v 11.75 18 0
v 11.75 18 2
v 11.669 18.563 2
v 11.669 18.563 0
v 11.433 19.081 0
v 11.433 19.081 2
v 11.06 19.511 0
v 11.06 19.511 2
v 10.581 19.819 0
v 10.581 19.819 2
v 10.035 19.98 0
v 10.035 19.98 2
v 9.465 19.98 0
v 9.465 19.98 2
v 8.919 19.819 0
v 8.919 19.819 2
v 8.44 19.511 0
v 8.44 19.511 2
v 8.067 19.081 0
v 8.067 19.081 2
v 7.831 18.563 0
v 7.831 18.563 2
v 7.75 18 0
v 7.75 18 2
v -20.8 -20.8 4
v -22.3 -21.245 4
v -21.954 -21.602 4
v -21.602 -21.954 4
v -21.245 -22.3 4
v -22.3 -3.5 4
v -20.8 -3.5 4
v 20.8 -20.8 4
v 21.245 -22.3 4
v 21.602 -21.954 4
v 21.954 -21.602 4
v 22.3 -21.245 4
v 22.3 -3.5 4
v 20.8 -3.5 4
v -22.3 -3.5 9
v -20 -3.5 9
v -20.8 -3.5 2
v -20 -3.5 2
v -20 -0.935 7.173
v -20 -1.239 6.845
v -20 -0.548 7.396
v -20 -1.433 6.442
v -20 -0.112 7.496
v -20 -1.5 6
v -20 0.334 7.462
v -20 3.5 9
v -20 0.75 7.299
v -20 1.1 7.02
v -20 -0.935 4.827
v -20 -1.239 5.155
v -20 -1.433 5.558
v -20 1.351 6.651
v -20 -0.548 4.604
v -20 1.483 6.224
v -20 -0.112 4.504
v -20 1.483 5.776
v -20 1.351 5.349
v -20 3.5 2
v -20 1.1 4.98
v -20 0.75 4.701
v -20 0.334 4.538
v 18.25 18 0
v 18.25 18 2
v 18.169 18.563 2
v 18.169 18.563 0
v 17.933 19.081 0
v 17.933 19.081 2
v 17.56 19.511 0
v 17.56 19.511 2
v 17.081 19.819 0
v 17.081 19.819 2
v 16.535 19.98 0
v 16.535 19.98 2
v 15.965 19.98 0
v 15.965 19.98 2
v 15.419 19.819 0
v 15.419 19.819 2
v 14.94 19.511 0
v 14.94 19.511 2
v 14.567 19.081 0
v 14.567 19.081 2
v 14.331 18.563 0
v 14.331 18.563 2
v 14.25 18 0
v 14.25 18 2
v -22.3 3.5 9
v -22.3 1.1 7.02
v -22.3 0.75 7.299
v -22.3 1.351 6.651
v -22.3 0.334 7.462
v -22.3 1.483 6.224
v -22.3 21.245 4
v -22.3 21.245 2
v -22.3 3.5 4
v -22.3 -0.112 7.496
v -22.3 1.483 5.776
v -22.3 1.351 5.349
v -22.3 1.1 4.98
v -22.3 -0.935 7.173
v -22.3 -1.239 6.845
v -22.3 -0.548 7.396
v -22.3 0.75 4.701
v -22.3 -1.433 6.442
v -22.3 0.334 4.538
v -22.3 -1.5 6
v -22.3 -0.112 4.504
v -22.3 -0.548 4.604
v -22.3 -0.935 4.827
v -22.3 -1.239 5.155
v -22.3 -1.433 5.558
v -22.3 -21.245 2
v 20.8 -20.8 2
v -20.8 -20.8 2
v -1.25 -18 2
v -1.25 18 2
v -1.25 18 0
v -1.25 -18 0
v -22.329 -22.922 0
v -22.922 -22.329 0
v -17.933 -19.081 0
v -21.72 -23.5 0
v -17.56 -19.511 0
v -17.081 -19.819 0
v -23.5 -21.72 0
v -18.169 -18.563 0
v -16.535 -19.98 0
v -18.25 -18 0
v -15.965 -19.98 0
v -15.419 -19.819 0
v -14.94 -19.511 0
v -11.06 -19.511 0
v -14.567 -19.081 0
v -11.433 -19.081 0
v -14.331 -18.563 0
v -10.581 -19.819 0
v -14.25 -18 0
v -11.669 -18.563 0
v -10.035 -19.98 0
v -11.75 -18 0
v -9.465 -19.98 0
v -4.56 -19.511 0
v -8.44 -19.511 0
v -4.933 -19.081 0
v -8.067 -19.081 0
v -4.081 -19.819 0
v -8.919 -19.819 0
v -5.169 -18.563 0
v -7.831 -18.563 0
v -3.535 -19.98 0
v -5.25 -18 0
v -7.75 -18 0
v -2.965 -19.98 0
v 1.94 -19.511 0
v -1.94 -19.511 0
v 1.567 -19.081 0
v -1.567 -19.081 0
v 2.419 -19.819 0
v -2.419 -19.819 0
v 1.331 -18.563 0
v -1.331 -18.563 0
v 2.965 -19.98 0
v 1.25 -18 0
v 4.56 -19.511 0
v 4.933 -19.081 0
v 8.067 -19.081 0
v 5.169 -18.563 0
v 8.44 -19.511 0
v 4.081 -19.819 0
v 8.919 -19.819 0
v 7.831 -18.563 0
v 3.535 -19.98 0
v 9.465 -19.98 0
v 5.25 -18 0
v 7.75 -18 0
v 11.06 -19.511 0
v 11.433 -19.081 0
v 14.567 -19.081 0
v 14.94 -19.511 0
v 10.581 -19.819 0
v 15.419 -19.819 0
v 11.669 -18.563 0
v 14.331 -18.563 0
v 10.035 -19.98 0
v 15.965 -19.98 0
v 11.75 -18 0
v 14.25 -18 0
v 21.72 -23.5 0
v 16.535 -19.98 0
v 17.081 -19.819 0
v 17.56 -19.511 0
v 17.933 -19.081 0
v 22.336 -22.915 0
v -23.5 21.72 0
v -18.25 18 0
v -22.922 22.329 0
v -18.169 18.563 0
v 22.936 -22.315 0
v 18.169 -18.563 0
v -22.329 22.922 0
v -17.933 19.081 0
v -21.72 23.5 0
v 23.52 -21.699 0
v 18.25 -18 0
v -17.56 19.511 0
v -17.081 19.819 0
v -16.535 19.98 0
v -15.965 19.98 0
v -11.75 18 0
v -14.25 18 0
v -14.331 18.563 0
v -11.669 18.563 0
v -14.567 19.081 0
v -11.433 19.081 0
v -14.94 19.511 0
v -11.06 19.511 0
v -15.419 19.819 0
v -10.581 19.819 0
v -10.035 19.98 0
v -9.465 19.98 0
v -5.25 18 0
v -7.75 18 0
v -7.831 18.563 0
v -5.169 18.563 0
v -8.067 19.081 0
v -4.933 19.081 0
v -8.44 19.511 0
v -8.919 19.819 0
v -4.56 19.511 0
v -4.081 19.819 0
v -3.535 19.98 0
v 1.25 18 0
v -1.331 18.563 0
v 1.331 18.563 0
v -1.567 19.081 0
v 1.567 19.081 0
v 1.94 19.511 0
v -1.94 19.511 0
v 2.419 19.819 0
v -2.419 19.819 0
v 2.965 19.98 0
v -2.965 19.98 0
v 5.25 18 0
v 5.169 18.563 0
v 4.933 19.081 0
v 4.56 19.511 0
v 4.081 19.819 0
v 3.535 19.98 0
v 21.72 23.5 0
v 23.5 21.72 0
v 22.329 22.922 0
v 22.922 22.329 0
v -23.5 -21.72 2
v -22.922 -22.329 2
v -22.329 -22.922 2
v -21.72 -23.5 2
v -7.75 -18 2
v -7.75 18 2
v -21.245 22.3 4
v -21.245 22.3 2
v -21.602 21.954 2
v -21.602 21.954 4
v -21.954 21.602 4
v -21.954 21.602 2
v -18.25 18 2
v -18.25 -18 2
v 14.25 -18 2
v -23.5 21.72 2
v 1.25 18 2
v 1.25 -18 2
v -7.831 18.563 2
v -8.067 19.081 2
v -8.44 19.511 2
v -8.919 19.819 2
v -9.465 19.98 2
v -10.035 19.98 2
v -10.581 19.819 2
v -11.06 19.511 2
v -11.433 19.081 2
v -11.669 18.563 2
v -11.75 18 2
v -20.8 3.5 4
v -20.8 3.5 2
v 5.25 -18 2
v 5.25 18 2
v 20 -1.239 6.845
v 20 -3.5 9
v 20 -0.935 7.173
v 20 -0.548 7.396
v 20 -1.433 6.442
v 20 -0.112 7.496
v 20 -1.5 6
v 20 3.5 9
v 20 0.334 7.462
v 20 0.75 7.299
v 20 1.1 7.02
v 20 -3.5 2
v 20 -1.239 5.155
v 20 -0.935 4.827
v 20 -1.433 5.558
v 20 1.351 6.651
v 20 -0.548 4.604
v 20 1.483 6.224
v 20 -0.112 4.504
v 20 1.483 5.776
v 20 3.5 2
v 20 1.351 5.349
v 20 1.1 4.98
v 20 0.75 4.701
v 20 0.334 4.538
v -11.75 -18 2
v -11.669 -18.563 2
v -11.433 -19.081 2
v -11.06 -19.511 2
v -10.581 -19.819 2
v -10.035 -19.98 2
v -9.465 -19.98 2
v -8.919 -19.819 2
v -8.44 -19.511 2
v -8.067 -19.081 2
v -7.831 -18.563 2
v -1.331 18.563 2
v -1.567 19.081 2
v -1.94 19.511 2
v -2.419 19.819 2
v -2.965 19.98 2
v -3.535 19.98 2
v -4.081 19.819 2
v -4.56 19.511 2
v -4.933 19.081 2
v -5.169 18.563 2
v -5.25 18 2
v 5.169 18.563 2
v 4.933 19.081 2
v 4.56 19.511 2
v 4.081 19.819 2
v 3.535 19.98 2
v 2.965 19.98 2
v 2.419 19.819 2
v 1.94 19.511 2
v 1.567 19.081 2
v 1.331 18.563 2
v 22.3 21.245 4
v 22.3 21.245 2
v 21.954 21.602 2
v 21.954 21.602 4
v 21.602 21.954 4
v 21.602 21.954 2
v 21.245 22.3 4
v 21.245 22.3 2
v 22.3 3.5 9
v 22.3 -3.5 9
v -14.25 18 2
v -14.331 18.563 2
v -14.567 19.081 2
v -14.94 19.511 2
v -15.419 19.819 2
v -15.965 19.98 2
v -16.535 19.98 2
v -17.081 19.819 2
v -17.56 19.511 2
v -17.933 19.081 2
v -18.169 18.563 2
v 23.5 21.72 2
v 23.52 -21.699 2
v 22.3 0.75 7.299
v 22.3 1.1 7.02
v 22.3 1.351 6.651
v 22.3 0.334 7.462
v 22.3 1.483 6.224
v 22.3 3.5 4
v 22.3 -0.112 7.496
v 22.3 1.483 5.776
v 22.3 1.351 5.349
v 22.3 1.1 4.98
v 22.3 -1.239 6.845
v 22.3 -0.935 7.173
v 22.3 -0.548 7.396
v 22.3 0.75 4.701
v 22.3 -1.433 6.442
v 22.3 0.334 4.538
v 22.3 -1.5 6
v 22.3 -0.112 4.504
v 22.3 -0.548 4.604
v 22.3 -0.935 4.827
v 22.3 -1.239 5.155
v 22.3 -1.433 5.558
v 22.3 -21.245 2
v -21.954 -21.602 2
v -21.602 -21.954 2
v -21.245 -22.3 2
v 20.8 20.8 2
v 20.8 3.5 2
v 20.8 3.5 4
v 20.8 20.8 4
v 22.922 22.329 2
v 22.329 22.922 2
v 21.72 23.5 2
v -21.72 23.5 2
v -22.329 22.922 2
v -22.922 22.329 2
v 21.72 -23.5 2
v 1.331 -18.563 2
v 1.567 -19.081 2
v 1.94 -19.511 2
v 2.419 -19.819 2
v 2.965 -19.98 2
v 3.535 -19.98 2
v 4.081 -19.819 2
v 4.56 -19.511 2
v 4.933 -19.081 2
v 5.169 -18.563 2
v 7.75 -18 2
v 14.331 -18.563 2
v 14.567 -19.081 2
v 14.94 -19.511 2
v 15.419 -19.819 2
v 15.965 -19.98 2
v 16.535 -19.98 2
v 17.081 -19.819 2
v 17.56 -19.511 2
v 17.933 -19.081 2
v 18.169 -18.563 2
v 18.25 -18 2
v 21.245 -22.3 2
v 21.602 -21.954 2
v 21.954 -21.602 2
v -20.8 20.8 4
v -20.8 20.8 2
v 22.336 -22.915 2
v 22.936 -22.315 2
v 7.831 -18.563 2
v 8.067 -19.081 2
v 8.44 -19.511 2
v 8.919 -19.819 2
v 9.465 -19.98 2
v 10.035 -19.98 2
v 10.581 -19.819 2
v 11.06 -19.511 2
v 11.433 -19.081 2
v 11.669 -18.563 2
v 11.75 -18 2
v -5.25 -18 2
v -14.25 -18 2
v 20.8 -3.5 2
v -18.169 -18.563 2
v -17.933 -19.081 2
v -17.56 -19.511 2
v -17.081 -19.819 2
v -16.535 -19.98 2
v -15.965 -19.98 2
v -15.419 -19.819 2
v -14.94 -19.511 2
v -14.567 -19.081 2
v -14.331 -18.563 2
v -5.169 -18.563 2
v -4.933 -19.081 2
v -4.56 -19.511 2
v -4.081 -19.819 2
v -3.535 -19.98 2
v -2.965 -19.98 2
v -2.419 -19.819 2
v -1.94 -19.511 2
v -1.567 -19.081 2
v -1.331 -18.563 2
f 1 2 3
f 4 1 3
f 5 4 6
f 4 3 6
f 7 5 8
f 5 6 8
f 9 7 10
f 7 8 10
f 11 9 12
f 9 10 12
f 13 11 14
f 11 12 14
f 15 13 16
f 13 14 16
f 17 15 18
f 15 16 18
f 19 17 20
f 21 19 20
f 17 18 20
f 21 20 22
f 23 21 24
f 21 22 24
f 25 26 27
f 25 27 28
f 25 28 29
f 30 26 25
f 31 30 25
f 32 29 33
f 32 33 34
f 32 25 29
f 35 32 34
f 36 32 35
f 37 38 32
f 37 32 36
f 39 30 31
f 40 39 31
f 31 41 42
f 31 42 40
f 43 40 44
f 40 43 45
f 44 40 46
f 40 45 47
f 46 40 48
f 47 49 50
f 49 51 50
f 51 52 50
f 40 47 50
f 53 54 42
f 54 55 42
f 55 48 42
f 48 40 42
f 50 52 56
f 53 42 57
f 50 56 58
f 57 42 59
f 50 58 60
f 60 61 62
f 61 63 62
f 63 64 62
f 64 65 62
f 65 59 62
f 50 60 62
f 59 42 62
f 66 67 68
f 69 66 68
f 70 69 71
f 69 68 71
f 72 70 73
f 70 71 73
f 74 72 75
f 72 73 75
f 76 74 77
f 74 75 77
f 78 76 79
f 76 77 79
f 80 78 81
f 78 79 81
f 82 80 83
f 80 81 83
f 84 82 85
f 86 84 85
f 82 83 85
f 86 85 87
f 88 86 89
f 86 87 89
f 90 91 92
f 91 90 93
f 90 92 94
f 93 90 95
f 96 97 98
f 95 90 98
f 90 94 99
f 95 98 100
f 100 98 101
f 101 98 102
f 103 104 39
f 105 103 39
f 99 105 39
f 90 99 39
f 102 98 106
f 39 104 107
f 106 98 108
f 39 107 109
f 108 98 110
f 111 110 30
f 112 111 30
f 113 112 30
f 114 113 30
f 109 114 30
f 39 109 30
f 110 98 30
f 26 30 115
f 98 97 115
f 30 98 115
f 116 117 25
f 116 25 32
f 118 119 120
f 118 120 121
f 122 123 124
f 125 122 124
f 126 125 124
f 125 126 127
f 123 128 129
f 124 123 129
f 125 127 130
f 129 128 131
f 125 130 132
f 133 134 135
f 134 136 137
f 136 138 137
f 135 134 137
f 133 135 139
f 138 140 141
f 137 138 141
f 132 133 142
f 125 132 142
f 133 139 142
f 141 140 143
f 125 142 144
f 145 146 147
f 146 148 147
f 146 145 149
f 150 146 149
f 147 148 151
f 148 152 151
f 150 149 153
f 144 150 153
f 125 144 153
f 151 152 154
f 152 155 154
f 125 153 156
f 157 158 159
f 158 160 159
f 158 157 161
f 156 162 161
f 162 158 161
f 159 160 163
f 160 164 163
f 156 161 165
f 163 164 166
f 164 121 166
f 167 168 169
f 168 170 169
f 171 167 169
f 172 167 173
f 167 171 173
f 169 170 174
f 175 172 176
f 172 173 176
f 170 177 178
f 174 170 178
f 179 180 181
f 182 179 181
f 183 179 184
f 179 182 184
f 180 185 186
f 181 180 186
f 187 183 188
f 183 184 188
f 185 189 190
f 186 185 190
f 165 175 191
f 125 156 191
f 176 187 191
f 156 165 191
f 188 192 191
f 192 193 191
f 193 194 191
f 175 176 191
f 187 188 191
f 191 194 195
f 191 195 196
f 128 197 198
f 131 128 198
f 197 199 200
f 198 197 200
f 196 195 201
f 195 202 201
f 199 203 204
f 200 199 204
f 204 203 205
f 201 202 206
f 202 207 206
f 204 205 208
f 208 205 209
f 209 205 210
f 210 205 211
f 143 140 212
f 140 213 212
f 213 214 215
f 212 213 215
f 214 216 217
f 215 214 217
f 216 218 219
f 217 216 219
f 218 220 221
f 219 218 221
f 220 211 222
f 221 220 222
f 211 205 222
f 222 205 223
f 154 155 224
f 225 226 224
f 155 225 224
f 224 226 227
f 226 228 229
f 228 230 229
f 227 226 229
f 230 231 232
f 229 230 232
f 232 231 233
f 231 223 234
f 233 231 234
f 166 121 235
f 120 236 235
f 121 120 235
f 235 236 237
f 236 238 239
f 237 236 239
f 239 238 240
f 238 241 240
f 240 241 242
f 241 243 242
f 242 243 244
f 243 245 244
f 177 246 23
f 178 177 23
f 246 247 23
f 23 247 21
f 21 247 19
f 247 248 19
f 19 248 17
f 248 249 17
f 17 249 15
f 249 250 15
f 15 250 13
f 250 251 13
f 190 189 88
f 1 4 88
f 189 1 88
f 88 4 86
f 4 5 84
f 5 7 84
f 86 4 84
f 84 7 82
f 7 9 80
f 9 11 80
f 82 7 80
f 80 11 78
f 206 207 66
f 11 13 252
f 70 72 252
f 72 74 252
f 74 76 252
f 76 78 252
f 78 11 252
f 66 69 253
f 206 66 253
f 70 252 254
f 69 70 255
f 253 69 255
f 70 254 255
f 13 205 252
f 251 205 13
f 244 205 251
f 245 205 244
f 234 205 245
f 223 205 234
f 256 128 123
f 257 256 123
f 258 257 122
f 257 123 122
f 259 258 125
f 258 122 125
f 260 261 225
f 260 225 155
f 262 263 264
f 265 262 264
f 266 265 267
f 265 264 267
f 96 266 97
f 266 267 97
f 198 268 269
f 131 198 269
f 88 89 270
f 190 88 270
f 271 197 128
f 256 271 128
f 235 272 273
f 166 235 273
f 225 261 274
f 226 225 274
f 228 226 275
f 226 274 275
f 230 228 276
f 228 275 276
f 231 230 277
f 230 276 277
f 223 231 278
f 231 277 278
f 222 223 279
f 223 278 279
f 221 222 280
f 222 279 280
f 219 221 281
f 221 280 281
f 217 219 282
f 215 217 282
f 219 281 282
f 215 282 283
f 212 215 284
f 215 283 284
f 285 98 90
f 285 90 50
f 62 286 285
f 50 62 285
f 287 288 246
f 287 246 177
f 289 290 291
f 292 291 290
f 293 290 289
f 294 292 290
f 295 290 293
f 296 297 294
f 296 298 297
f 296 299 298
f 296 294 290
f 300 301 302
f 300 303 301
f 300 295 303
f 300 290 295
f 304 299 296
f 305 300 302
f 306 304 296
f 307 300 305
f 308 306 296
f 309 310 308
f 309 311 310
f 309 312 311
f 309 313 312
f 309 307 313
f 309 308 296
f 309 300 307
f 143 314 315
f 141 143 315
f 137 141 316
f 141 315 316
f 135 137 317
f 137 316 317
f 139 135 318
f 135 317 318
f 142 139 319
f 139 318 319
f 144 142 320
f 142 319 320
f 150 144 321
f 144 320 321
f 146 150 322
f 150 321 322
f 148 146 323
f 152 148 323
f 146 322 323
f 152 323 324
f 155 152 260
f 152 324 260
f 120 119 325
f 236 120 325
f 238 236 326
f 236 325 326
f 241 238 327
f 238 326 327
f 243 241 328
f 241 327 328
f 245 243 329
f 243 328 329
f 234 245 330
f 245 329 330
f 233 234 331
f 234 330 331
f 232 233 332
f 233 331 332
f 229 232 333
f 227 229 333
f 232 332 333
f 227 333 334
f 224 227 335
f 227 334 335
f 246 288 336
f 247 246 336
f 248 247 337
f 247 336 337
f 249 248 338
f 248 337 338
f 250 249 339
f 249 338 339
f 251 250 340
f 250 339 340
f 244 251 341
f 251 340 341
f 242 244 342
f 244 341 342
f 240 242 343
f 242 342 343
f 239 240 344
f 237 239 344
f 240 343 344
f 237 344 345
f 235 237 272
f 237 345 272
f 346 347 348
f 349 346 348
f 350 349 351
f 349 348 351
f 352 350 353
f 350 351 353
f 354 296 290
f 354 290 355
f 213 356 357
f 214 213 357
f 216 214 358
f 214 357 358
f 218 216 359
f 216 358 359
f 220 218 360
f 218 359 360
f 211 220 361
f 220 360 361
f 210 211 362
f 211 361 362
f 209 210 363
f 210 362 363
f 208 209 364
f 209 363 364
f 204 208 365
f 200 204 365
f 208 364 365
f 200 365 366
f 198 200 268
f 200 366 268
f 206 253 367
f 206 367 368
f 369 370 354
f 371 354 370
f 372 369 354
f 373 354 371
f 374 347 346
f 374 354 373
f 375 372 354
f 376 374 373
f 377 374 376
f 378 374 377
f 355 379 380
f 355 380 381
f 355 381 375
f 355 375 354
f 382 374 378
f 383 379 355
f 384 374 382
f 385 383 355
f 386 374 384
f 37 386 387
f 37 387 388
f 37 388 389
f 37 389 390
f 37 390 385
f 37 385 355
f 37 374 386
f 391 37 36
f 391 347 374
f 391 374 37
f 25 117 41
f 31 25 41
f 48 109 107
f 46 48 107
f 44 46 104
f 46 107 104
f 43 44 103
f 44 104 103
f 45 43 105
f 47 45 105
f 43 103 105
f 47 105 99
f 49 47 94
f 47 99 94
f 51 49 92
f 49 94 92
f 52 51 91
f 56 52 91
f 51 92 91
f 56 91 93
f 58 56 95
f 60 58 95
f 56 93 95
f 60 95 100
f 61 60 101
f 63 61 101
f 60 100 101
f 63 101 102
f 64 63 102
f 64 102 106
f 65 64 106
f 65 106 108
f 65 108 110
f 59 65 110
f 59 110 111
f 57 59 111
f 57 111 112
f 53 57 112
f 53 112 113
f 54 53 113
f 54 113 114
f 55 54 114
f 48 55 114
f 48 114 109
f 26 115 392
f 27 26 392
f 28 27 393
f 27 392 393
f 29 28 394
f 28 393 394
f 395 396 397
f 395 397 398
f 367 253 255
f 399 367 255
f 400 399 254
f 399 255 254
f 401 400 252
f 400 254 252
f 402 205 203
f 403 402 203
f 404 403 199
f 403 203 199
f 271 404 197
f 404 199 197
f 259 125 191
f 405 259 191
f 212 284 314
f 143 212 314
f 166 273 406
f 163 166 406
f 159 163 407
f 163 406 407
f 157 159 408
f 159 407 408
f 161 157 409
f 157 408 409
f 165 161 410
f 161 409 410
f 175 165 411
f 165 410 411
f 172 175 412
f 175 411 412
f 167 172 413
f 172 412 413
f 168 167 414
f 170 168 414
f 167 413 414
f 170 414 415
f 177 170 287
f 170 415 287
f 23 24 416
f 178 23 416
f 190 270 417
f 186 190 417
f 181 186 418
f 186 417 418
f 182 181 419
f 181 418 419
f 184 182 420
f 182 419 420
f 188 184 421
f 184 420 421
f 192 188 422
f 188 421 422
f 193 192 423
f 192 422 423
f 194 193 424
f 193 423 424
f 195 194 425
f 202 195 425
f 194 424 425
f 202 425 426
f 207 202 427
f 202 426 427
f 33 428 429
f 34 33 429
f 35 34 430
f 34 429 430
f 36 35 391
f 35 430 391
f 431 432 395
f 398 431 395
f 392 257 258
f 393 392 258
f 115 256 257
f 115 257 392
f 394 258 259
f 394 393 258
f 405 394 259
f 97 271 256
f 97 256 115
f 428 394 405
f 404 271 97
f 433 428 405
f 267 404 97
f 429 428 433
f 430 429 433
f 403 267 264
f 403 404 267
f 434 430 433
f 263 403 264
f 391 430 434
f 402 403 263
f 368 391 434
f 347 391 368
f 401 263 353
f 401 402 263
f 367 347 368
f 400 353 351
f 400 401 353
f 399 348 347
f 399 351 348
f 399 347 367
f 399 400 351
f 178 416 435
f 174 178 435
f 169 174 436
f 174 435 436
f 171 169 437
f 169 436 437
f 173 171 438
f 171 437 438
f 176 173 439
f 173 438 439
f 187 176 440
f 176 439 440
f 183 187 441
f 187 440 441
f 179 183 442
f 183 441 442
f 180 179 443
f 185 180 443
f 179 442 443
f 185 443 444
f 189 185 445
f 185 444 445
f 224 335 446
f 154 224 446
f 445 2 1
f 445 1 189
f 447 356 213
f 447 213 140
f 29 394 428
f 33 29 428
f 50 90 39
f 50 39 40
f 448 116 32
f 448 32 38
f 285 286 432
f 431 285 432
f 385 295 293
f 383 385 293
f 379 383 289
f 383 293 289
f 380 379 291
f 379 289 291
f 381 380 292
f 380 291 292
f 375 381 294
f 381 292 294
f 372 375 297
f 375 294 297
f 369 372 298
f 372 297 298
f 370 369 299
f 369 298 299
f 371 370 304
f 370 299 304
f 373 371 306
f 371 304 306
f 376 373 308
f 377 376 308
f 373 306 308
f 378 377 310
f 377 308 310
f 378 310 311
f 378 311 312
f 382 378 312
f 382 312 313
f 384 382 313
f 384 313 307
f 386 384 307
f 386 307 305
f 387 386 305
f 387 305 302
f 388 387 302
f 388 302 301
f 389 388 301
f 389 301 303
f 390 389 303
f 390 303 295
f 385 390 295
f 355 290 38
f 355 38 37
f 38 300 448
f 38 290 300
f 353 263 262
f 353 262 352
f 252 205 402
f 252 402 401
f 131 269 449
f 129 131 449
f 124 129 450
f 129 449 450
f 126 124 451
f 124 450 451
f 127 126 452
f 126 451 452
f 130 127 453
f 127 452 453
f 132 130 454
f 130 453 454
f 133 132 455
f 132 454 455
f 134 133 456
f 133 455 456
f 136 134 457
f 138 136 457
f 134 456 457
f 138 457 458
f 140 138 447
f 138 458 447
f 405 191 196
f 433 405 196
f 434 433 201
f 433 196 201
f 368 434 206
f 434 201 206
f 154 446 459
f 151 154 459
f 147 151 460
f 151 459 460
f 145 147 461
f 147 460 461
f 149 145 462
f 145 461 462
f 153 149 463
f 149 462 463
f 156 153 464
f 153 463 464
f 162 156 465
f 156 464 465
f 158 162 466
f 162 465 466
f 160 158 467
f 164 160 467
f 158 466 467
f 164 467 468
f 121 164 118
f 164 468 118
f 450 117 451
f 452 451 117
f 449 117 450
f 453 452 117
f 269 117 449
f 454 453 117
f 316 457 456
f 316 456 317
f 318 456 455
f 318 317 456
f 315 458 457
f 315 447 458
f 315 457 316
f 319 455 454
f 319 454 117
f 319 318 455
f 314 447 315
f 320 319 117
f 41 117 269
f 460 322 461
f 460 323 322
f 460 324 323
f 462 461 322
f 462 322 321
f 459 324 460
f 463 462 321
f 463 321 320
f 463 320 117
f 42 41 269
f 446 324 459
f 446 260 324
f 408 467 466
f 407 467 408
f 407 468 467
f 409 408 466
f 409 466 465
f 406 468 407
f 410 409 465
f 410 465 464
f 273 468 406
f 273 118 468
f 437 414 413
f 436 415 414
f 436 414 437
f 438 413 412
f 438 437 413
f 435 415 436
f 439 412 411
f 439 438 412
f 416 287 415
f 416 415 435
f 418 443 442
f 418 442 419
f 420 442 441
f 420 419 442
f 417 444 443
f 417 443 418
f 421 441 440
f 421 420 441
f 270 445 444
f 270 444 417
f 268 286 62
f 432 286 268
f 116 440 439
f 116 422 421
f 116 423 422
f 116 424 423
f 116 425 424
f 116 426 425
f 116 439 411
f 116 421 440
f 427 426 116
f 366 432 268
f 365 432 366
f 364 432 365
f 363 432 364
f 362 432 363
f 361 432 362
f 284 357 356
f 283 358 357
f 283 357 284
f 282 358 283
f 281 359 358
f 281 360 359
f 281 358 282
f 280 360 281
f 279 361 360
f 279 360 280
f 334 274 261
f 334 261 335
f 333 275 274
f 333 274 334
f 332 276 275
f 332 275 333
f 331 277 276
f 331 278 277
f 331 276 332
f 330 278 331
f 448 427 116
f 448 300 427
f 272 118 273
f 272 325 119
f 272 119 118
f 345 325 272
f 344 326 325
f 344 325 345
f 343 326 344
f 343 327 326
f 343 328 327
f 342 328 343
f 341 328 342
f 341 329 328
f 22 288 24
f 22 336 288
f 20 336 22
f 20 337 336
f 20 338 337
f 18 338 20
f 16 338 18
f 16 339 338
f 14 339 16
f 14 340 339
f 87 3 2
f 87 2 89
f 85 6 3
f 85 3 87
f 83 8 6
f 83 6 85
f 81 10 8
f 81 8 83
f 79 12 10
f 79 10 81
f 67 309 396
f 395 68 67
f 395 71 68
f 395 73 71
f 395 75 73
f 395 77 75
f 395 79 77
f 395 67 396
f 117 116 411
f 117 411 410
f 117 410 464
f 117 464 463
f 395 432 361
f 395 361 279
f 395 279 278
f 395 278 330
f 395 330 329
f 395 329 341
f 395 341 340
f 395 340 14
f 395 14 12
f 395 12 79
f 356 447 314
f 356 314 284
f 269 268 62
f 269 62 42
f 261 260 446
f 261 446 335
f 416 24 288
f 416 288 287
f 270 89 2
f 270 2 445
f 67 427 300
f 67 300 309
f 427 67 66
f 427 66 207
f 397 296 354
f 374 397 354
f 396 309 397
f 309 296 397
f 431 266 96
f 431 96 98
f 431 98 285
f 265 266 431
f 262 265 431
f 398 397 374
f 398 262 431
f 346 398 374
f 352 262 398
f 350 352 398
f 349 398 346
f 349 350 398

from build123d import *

# Parameters (mm, degrees)
PAD_DEPTH       = 2
SKETCH001_W     = 41.6
SKETCH001_H     = 41.6
PAD001_DEPTH    = 2
SKETCH002_W     = 2.3
SKETCH002_H     = 7
PAD002_DEPTH    = 7
SKETCH003_R     = 1.5
POCKET_DEPTH    = 45.820651
POCKET001_DEPTH = 2.001


with BuildPart() as part:
    # Sketch → Pad (new body)
    with BuildSketch(Plane.XY):
        with BuildLine():
            Line((-23.5, 21.719807), (-23.5, -21.719807))
            ThreePointArc((-23.5, -21.719807), (-22.627417, -22.627417), (-21.719807, -23.5))
            Line((-21.719807, -23.5), (21.719807, -23.5))
            ThreePointArc((21.719807, -23.5), (22.637656, -22.617174), (23.519651, -21.698526))
            Line((23.5, 21.719807), (23.519651, -21.698526))
            ThreePointArc((23.5, 21.719807), (22.627417, 22.627417), (21.719807, 23.5))
            Line((-21.719807, 23.5), (21.719807, 23.5))
            ThreePointArc((-21.719807, 23.5), (-22.627417, 22.627417), (-23.5, 21.719807))
        make_face()
    extrude(amount=PAD_DEPTH)

    # Sketch001 (on Face10 of Pad) → Pad001 (join)
    with BuildSketch(Plane.XY.offset(2)):
        with BuildLine():
            Line((-22.3, 21.244999), (-22.3, -21.244999))
            ThreePointArc((-22.3, -21.244999), (-21.778889, -21.778889), (-21.244999, -22.3))
            Line((-21.244999, -22.3), (21.244999, -22.3))
            ThreePointArc((21.244999, -22.3), (21.778889, -21.778889), (22.3, -21.244999))
            Line((22.3, 21.244999), (22.3, -21.244999))
            ThreePointArc((22.3, 21.244999), (21.778889, 21.778889), (21.244999, 22.3))
            Line((-21.244999, 22.3), (21.244999, 22.3))
            ThreePointArc((-21.244999, 22.3), (-21.778889, 21.778889), (-22.3, 21.244999))
        make_face()
        Rectangle(SKETCH001_W, SKETCH001_H, mode=Mode.SUBTRACT)
    extrude(amount=PAD001_DEPTH)

    # Sketch002 (on Face24 of Pad001) → Pad002 (join)
    with BuildSketch(Plane.XY.offset(2)):
        with Locations((-21.15, 0)):
            Rectangle(SKETCH002_W, SKETCH002_H)
        with Locations((21.15, 0)):
            Rectangle(SKETCH002_W, SKETCH002_H)
    extrude(amount=PAD002_DEPTH)

    # Sketch003 (on Face24 of Pad002) → Pocket (cut, through all)
    with BuildSketch(Plane(origin=(-22.3, 0, 0), x_dir=(0, -1, 0), z_dir=(-1, 0, 0))):
        with Locations((0, 6)):
            Circle(SKETCH003_R)
    extrude(amount=-POCKET_DEPTH, mode=Mode.SUBTRACT)

    # Sketch004 (on Face41 of Pocket) → Pocket001 (cut, through all)
    with BuildSketch(Plane.XY.offset(2)):
        with BuildLine():
            Line((-1.25, 18), (-1.25, -18))
            ThreePointArc((-5.25, -18), (-3.25, -20), (-1.25, -18))
            Line((-5.25, 18), (-5.25, -18))
            ThreePointArc((-1.25, 18), (-3.25, 20), (-5.25, 18))
        make_face()
        with BuildLine():
            Line((-7.75, 18), (-7.75, -18))
            ThreePointArc((-11.75, -18), (-9.75, -20), (-7.75, -18))
            Line((-11.75, 18), (-11.75, -18))
            ThreePointArc((-7.75, 18), (-9.75, 20), (-11.75, 18))
        make_face()
        with BuildLine():
            Line((-14.25, 18), (-14.25, -18))
            ThreePointArc((-18.25, -18), (-16.25, -20), (-14.25, -18))
            Line((-18.25, 18), (-18.25, -18))
            ThreePointArc((-14.25, 18), (-16.25, 20), (-18.25, 18))
        make_face()
        with BuildLine():
            Line((1.25, 18), (1.25, -18))
            ThreePointArc((1.25, -18), (3.25, -20), (5.25, -18))
            Line((5.25, 18), (5.25, -18))
            ThreePointArc((5.25, 18), (3.25, 20), (1.25, 18))
        make_face()
        with BuildLine():
            Line((7.75, 18), (7.75, -18))
            ThreePointArc((7.75, -18), (9.75, -20), (11.75, -18))
            Line((11.75, 18), (11.75, -18))
            ThreePointArc((11.75, 18), (9.75, 20), (7.75, 18))
        make_face()
        with BuildLine():
            Line((14.25, 18), (14.25, -18))
            ThreePointArc((14.25, -18), (16.25, -20), (18.25, -18))
            Line((18.25, 18), (18.25, -18))
            ThreePointArc((18.25, 18), (16.25, 20), (14.25, 18))
        make_face()
    extrude(amount=-POCKET001_DEPTH, mode=Mode.SUBTRACT)


solid = part.part
